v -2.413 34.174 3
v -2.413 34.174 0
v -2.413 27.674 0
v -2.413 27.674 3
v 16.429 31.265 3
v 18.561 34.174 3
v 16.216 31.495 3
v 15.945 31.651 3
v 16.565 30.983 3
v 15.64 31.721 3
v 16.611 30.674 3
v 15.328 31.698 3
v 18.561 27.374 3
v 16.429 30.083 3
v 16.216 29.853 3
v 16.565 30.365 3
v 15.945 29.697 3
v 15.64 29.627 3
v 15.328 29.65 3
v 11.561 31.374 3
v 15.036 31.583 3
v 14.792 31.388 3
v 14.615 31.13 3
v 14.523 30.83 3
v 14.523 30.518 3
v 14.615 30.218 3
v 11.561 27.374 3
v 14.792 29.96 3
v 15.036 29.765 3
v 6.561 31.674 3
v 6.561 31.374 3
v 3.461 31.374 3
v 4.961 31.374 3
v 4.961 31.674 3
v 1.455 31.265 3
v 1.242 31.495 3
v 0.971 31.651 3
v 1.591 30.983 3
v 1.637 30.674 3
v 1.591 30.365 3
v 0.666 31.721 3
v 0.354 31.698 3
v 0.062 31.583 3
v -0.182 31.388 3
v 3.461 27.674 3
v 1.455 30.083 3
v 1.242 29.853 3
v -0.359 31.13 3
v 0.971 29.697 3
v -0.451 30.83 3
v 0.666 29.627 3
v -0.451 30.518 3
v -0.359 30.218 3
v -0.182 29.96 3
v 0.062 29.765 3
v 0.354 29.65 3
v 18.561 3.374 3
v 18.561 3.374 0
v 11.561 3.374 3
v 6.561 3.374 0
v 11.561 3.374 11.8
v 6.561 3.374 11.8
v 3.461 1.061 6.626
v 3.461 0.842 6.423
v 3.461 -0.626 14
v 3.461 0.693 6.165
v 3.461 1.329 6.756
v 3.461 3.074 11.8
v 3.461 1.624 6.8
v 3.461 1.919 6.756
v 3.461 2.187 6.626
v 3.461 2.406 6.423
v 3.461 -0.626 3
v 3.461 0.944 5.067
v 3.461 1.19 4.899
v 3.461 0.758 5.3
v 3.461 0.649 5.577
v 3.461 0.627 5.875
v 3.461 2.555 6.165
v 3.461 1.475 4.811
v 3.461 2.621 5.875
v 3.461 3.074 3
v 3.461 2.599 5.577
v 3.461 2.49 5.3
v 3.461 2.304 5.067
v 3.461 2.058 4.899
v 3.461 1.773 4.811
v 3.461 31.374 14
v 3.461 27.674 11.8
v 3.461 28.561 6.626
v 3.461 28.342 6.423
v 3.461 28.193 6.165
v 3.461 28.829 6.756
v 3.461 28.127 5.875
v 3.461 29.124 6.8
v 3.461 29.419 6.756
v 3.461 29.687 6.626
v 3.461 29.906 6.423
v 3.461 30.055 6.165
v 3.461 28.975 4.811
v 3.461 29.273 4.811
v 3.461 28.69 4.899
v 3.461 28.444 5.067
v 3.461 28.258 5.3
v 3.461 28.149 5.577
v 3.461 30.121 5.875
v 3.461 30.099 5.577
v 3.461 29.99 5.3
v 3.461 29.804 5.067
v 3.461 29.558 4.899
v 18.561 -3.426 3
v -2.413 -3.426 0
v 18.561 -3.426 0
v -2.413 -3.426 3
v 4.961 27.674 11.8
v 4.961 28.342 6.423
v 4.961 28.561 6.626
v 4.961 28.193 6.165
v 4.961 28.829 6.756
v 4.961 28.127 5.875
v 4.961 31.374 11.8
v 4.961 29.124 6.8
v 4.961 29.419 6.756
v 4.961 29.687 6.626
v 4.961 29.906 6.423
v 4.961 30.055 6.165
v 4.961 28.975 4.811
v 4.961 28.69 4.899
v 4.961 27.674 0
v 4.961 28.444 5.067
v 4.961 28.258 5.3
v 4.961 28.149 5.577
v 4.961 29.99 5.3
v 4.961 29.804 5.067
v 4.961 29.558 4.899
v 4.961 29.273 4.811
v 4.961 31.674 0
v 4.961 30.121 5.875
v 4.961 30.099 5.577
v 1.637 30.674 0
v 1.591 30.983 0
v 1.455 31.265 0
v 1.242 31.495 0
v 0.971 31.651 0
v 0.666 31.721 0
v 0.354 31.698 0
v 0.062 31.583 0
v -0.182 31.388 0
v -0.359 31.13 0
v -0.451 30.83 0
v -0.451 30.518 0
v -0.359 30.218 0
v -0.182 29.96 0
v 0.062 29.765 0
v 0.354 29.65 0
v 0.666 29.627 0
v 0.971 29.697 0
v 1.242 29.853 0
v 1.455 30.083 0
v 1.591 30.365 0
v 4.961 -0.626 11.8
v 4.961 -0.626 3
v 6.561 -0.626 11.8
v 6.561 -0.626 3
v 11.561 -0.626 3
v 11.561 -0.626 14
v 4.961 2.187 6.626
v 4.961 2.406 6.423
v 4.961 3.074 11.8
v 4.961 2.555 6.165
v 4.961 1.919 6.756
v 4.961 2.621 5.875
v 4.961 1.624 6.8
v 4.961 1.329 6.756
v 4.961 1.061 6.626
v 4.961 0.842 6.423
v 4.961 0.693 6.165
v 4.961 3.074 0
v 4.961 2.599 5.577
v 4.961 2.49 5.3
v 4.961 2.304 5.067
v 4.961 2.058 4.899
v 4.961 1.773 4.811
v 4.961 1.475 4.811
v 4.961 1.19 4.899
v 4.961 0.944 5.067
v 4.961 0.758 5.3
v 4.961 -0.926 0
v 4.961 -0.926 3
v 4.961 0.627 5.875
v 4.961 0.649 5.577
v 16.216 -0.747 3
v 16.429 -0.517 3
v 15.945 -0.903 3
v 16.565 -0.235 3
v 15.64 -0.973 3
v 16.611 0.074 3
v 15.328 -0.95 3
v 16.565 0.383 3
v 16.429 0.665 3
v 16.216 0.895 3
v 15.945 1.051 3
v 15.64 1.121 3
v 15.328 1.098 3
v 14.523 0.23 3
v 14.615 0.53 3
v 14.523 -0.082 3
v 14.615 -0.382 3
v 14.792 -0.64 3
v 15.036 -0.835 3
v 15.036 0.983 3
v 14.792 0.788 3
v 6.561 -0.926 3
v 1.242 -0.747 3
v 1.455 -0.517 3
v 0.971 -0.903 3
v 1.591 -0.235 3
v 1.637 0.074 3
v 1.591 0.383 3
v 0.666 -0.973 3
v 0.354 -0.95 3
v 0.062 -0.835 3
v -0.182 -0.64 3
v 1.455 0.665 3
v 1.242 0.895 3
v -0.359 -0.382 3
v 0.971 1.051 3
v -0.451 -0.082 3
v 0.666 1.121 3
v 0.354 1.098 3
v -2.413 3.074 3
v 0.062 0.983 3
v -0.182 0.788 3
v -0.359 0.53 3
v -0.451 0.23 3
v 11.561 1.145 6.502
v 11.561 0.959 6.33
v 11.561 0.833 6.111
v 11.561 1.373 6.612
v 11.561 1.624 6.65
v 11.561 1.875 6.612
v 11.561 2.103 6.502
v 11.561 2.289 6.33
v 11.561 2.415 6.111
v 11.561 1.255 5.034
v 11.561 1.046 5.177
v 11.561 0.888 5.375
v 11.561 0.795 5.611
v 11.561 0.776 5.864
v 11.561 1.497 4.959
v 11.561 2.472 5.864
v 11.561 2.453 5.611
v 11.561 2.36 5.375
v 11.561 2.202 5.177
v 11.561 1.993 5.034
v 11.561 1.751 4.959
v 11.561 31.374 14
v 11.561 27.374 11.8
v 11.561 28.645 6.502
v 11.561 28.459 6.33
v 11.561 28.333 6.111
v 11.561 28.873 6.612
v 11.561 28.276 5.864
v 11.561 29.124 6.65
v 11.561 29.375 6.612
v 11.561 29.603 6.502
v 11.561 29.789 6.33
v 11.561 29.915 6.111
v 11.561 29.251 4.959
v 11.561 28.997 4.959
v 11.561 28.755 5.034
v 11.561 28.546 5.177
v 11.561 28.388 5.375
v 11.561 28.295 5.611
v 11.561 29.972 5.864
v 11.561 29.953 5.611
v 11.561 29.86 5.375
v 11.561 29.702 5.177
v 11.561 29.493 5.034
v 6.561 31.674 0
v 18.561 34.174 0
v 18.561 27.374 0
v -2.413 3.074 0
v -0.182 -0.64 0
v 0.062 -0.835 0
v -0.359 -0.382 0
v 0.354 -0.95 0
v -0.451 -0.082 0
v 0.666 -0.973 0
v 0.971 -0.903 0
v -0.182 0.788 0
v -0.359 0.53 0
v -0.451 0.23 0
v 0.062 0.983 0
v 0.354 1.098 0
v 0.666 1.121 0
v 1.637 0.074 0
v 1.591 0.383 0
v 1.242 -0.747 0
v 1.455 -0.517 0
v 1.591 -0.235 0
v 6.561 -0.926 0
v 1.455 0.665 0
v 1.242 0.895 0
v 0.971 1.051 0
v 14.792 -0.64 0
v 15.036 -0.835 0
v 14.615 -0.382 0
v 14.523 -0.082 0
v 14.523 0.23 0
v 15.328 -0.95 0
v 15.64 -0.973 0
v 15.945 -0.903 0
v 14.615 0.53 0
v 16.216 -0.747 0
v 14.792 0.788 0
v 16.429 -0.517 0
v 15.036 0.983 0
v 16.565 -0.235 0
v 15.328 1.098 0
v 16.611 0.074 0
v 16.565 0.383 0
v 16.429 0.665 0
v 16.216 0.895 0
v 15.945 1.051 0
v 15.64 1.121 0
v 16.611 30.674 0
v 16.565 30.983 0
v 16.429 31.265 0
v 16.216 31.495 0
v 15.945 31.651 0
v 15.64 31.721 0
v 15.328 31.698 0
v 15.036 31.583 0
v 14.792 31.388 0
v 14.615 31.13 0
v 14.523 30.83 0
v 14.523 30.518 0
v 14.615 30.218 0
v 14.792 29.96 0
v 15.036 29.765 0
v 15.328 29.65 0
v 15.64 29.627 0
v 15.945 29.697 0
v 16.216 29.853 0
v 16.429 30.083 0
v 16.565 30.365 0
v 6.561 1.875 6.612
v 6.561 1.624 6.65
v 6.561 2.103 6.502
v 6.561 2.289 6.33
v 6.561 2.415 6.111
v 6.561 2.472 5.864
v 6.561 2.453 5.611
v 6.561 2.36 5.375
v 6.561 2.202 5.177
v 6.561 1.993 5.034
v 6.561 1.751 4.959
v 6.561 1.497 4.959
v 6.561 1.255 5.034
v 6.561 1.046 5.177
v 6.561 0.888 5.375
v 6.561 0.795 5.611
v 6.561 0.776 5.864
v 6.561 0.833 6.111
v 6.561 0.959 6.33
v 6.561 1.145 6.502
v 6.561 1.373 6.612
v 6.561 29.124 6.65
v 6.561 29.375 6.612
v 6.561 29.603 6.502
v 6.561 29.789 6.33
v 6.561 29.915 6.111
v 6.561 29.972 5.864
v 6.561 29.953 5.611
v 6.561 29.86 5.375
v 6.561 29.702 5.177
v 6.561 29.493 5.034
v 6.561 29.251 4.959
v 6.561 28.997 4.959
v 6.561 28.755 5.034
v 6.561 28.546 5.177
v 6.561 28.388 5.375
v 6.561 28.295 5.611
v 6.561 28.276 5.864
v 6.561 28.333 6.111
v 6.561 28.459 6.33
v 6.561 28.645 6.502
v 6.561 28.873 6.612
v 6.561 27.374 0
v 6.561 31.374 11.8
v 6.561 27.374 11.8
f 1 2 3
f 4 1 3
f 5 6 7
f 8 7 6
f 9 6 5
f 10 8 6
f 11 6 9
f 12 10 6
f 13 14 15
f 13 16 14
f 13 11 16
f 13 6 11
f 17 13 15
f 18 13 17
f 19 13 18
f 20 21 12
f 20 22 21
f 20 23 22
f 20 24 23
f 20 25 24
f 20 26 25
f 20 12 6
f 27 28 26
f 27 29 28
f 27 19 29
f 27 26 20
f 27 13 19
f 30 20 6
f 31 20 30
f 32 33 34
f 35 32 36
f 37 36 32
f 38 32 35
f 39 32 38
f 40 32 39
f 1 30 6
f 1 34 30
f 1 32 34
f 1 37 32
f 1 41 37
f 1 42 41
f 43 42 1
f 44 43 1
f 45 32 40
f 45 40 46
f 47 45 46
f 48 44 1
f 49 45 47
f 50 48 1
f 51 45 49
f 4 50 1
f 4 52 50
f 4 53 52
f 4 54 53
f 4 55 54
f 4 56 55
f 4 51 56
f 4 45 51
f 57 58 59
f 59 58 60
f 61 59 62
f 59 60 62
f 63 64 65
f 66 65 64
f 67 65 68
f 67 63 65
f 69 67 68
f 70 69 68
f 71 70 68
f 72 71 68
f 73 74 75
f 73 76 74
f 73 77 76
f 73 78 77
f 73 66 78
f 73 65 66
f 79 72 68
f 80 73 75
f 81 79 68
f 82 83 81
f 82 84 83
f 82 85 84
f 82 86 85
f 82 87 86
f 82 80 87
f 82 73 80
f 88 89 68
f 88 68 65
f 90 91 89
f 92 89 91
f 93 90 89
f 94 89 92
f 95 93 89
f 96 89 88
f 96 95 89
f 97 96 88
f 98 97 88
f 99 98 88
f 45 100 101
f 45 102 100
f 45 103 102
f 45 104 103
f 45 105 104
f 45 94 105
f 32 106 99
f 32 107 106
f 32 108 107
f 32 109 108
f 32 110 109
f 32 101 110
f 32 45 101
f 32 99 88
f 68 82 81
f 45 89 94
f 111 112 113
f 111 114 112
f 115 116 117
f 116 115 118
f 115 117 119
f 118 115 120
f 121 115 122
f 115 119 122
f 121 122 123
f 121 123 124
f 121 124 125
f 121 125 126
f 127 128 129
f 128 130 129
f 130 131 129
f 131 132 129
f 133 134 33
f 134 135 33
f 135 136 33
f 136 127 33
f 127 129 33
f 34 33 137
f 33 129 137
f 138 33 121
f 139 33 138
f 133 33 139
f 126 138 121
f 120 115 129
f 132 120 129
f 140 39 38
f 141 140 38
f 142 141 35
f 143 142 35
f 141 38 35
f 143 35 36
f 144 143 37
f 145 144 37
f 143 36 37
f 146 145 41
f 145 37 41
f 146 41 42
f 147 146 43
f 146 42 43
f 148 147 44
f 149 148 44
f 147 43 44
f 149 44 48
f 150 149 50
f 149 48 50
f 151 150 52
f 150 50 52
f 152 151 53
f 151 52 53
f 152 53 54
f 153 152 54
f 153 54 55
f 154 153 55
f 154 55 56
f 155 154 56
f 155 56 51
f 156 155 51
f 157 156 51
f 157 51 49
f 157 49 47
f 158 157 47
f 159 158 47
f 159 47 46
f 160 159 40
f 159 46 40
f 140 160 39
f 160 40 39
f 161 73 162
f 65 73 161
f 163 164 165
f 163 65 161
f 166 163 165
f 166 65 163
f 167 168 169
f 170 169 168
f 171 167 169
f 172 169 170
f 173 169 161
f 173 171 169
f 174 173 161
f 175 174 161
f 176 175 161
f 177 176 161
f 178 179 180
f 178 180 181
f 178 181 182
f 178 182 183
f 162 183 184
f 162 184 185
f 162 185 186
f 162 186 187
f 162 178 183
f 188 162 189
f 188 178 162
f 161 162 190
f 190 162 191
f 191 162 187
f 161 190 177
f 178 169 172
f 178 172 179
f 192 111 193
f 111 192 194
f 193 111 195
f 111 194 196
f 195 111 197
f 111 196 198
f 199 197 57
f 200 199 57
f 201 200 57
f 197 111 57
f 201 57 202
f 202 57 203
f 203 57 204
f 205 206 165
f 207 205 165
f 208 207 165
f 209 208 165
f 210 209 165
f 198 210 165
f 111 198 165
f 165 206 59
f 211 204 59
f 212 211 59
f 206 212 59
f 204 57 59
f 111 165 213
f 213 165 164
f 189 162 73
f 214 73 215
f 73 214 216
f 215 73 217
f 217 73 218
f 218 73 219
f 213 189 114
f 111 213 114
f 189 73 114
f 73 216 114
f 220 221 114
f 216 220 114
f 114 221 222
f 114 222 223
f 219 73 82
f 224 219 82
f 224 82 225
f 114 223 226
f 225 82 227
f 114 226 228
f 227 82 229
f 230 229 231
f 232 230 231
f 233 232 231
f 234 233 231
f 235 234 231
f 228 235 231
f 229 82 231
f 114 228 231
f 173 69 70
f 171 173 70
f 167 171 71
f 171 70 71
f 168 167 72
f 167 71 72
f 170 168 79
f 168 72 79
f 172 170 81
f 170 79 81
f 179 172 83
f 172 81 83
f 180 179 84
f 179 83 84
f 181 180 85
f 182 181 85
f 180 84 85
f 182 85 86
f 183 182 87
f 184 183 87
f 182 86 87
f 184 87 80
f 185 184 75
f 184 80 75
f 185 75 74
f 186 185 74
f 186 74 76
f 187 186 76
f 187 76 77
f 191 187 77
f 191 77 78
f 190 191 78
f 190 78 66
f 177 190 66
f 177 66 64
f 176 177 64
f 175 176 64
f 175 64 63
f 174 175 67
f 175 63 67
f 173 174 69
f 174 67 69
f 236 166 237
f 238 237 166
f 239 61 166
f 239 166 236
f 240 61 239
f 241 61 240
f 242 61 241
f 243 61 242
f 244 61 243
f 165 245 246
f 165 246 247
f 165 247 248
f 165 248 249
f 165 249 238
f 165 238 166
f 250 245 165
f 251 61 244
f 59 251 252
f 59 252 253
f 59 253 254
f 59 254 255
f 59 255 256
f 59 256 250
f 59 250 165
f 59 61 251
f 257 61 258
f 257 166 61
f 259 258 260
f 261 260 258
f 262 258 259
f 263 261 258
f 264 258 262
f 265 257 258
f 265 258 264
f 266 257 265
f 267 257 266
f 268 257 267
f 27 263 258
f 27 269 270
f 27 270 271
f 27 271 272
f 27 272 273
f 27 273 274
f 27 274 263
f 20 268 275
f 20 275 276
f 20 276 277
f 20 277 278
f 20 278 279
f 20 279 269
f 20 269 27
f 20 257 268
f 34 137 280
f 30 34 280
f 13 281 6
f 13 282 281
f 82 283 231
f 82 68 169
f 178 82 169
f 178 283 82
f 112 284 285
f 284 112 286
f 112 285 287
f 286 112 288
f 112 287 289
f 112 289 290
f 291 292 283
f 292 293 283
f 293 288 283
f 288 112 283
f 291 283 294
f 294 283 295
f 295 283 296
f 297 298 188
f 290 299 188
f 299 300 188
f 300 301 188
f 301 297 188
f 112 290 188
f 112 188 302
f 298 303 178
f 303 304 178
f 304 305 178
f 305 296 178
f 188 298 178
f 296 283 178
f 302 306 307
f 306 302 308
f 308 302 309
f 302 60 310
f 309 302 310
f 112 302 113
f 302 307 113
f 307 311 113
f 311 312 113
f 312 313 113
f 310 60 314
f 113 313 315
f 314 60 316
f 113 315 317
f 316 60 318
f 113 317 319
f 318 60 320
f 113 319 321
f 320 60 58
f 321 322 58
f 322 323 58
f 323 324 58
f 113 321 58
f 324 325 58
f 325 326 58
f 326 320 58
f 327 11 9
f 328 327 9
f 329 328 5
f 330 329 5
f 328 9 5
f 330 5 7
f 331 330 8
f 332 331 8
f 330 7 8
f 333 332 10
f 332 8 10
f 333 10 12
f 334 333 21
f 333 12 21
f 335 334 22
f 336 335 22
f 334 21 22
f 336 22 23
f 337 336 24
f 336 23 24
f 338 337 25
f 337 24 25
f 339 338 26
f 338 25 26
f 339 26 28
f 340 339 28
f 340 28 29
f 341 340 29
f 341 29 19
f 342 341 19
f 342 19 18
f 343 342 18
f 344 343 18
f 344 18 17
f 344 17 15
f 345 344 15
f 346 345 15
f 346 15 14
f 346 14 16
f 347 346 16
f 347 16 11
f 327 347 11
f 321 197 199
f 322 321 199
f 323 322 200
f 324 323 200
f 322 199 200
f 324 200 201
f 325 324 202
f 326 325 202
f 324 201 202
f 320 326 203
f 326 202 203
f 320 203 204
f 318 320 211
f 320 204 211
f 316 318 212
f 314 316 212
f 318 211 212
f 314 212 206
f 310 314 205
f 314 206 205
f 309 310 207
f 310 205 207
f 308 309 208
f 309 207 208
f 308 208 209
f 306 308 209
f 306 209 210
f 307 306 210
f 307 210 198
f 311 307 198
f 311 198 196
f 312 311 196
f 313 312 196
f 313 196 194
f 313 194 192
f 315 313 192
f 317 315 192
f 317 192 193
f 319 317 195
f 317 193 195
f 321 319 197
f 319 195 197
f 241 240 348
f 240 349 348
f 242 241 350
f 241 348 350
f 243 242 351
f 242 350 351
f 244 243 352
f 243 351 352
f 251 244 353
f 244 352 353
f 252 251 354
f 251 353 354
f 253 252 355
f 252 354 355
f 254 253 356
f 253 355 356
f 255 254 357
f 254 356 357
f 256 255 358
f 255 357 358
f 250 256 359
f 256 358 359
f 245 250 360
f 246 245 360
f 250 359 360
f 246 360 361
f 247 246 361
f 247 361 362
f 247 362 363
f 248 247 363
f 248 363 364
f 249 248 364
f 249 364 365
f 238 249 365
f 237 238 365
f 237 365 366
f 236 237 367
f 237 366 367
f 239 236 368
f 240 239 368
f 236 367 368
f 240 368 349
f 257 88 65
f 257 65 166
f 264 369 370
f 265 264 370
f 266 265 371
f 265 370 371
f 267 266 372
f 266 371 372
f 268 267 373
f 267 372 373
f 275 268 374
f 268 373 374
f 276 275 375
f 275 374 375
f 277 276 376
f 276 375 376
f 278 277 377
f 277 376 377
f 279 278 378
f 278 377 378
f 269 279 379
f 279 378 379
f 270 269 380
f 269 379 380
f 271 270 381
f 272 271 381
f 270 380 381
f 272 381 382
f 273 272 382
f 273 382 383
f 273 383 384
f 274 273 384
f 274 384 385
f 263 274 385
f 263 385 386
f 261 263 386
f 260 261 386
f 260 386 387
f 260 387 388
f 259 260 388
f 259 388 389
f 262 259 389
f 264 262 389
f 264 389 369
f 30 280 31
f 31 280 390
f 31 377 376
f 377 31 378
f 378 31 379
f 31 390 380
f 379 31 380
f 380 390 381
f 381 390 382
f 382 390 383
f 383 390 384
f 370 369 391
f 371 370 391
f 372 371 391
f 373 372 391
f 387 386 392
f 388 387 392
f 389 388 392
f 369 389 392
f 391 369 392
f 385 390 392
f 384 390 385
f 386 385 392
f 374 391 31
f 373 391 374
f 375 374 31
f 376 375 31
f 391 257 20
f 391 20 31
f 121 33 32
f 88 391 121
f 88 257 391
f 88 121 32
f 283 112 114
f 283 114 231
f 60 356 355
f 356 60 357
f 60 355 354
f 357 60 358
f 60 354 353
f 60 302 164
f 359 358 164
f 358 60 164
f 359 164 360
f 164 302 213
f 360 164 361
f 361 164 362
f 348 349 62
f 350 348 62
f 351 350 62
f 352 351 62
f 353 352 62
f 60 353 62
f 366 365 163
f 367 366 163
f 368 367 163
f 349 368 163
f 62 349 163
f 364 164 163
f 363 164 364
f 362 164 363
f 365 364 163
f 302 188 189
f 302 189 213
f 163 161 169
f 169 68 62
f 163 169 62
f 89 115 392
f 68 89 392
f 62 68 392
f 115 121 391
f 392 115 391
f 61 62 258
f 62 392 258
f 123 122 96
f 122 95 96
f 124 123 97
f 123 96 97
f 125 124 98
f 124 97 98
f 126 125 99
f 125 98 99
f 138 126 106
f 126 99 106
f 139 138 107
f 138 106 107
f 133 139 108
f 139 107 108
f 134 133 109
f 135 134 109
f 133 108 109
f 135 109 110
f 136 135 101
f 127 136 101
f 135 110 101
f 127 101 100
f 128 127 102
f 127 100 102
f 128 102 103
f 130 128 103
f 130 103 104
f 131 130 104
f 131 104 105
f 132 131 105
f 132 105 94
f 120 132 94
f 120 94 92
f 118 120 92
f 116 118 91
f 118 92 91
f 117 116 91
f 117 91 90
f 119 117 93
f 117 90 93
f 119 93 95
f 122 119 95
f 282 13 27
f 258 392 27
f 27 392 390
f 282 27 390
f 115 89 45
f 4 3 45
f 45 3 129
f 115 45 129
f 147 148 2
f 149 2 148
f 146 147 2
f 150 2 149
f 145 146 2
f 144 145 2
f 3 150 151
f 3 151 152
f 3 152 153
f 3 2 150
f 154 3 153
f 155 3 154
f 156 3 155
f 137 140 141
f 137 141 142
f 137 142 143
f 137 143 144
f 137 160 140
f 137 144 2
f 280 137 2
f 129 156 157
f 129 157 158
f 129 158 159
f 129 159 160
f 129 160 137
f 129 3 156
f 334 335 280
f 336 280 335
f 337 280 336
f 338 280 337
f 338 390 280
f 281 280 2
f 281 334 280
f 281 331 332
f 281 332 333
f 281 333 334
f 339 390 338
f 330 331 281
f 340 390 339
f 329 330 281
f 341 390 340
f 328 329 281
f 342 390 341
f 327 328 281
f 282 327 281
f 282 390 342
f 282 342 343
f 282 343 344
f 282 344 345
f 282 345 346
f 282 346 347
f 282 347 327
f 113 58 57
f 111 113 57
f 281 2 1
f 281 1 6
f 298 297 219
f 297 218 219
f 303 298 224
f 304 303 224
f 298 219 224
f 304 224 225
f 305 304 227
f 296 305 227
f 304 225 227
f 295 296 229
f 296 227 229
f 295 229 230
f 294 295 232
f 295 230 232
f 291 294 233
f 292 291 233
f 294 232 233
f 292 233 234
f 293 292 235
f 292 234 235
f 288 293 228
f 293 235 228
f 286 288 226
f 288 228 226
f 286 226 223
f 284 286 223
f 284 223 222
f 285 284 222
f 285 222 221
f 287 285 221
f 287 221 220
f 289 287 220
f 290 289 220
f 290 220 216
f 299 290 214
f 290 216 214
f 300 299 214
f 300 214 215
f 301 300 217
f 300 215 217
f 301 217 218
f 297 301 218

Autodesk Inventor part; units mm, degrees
ref_plane "YZ Plane" through (0, 0, 0) normal (1, 0, 0) x (0, 1, 0)
ref_plane "XZ Plane" through (0, 0, 0) normal (0, 1, 0) x (-1, 0, 0)
ref_plane "XY Plane" through (0, 0, 0) normal (0, 0, 1) x (1, 0, 0)
sketch "スケッチ1" plane through (0, 0, 0) normal (0, 0, 1) x (1, 0, 0)
  line L0 (4.7874, 3.074) -> (-2.4126, 3.074) construction
  line L1 (-2.4126, 3.074) -> (-2.4126, -2.5626) construction
  line L2 (4.6566, -2.5626) -> (-2.4126, -2.5626) construction
  line L3 (4.6566, -14.1826) -> (4.6566, -2.5626) construction
  line L4 (32.7567, -14.1826) -> (4.6566, -14.1826) construction
  arc A0 (33.6403, -15.0662) -> (32.7567, -14.1826) centre (32.7567, -15.0662) ccw construction
  line L5 (33.6403, -15.0662) -> (33.6403, -5.3461) construction
  arc A1 (32.7567, -6.2297) -> (33.6403, -5.3461) centre (32.7567, -5.3461) ccw construction
  line L6 (32.7567, -6.2297) -> (28.4268, -6.2297) construction
  line L7 (28.4268, 12.9897) -> (28.4268, -6.2297) construction
  line L8 (28.4268, 12.9897) -> (33.7287, 12.9897) construction
  line L9 (33.7287, 34.374) -> (33.7287, 12.9897) construction
  line L10 (-2.4126, 34.374) -> (33.7287, 34.374) construction
  line L11 (-2.4126, 34.374) -> (-2.4126, 27.674) construction
  line L12 (-2.4126, 27.674) -> (4.7874, 27.674) construction
  line L13 (4.7874, 27.674) -> (4.7874, 31.674) construction
  line L14 (4.7874, 31.674) -> (7.0874, 31.674) construction
  line L15 (7.0874, 31.674) -> (7.0874, 27.674) construction
  line L16 (7.0874, 27.674) -> (22.5874, 27.674) construction
  line L17 (22.5874, 27.674) -> (22.5874, 3.074) construction
  line L18 (22.5874, 3.074) -> (7.0874, 3.074) construction
  line L19 (7.0874, 3.074) -> (7.0874, -0.926) construction
  line L20 (7.0874, -0.926) -> (4.7874, -0.926) construction
  line L21 (4.7874, -0.926) -> (4.7874, 3.074) construction
  line L22 (4.9614, 30.124) -> (6.5614, 30.124) construction
  line L23 (4.9614, 28.124) -> (6.5614, 28.124) construction
  line L24 (6.5614, 27.174) -> (20.8114, 27.174) construction
  line L25 (6.5614, 29.374) -> (6.5614, 31.374) construction
  line L26 (6.5614, 26.174) -> (6.5614, 29.374) construction
  line L27 (18.4524, 3.574) -> (6.5614, 3.574) construction
  line L28 (6.5614, 1.374) -> (6.5614, 4.574) construction
  line L29 (6.5614, -0.626) -> (6.5614, 1.374) construction
  line L30 (4.9614, 2.624) -> (6.5614, 2.624) construction
  line L31 (4.9614, 0.624) -> (6.5614, 0.624) construction
  line L32 (6.5614, 31.374) -> (18.5614, 31.374)
  line L33 (18.5614, 31.374) -> (18.5614, -0.626)
  line L34 (18.5614, -0.626) -> (6.5614, -0.626)
  line L35 (6.5614, -0.626) -> (6.5614, 31.374)
  circle A2 centre (0.5874, 30.674) radius 0.8
  circle A3 centre (15.5614, 0.074) radius 0.8
  circle A4 centre (0.5874, 0.074) radius 0.8
  circle A5 centre (15.5614, 30.674) radius 0.8
  point P0 (0, 0)
extrude "押し出し1" add sketch "スケッチ1" along normal blind 14 contours L32 A5 L33 L34 A3 L35 | L32 A5 | A3 L34 picked at (15.5843, 30.875) picked at (15.5358, 0.3268)
sketch "スケッチ2" plane through (6.5614, -0.626, 0) normal (-1, 0, 0) x (0, 0, 1)
  line L0 (1, 27.8) -> (10.6, 27.8) construction
  arc A0 (11.6, 26.8) -> (10.6, 27.8) centre (10.6, 26.8) ccw construction
  line L1 (11.6, 26.8) -> (11.6, 30) construction
  arc A1 (11.6, 30) -> (9.6, 32) centre (9.6, 30) ccw construction
  line L2 (2, 32) -> (9.6, 32) construction
  arc A2 (2, 32) -> (0, 30) centre (2, 30) ccw construction
  line L3 (0, 26.8) -> (0, 30) construction
  arc A3 (1, 27.8) -> (0, 26.8) centre (1, 26.8) ccw construction
  circle A4 centre (5.8, 29.75) radius 1 construction
  arc A5 (10.6, 4.2) -> (11.6, 5.2) centre (10.6, 5.2) ccw construction
  line L4 (10.6, 4.2) -> (1, 4.2) construction
  arc A6 (0, 5.2) -> (1, 4.2) centre (1, 5.2) ccw construction
  line L5 (0, 2) -> (0, 5.2) construction
  arc A7 (0, 2) -> (2, 0) centre (2, 2) ccw construction
  line L6 (9.6, 0) -> (2, 0) construction
  arc A8 (9.6, 0) -> (11.6, 2) centre (9.6, 2) ccw construction
  line L7 (11.6, 2) -> (11.6, 5.2) construction
  circle A9 centre (5.8, 2.25) radius 1 construction
  circle A10 centre (5.8, 29.75) radius 0.85
  circle A11 centre (5.8, 2.25) radius 0.85
  point P0 (0, 0.626)
  dimension "d3" = 1.7
extrude "押し出し2" cut sketch "スケッチ2" against normal up to next
sketch "スケッチ3" plane through (6.5614, -0.626, 0) normal (-1, 0, 0) x (0, 0, 1)
  line L0 (9.6, 27.8) -> (2, 27.8) construction
  line L1 (11.6, 9.918) -> (11.6, 25.8) construction
  spline S0 degree 5 poles (31.6664, 3.8342) (33.0444, 2.9064) (34.3681, 1.8973) (35.6334, 0.8093) (37.4433, -0.9431) (39.0884, -2.8469) (39.625, -3.5071) (40.1413, -4.1828) (40.6369, -4.8737) knots 0.500883 0.500883 0.500883 0.500883 0.500883 0.500883 16.687593 16.687593 16.687593 24.970224 24.970224 24.970224 24.970224 24.970224 24.970224 construction
  line L2 (1, 27.8) -> (10.6, 27.8) construction
  arc A0 (11.6, 26.8) -> (10.6, 27.8) centre (10.6, 26.8) ccw construction
  line L3 (11.6, 26.8) -> (11.6, 30) construction
  arc A1 (11.6, 30) -> (9.6, 32) centre (9.6, 30) ccw construction
  line L4 (2, 32) -> (9.6, 32) construction
  arc A2 (2, 32) -> (0, 30) centre (2, 30) ccw construction
  line L5 (0, 26.8) -> (0, 30) construction
  arc A3 (1, 27.8) -> (0, 26.8) centre (1, 26.8) ccw construction
  circle A4 centre (5.8, 29.75) radius 1 construction
  arc A5 (10.6, 4.2) -> (11.6, 5.2) centre (10.6, 5.2) ccw construction
  line L6 (10.6, 4.2) -> (1, 4.2) construction
  arc A6 (0, 5.2) -> (1, 4.2) centre (1, 5.2) ccw construction
  line L7 (0, 2) -> (0, 5.2) construction
  arc A7 (0, 2) -> (2, 0) centre (2, 2) ccw construction
  line L8 (9.6, 0) -> (2, 0) construction
  arc A8 (9.6, 0) -> (11.6, 2) centre (9.6, 2) ccw construction
  line L9 (11.6, 2) -> (11.6, 5.2) construction
  circle A9 centre (5.8, 2.25) radius 1 construction
  line L10 (11.8, 28) -> (-0.2, 28)
  line L11 (-0.2, 28) -> (-0.2, 4)
  line L12 (-0.2, 4) -> (11.8, 4)
  line L13 (11.8, 4) -> (11.8, 28)
  line L14 (0, 0) -> (0, 32) projected
  point P0 (0, 0.626)
  dimension "d6" = 0.2
  dimension "d7" = 0.2
  dimension "d8" = 0.2
  dimension "d9" = 0.2
extrude "押し出し3" cut sketch "スケッチ3" against normal up to next
sketch "スケッチ4" plane through (6.5614, 31.374, 0) normal (0, 1, 0) x (1, 0, 0)
  line L0 (12, -14) -> (0, -14) projected
  line L1 (12, -14) -> (5, -14)
  line L2 (5, -14) -> (5, -3)
  line L3 (5, -3) -> (12, -3)
  line L4 (12, -3) -> (12, -14)
  line L5 (0, 0) -> (12, 0) projected
  point P0 (-6.5614, 0)
  dimension "d12" = 7
  dimension "d13" = 3
extrude "押し出し4" cut sketch "スケッチ4" against normal up to next
sketch "スケッチ5" plane through (6.5614, -0.626, 0) normal (0, -1, 0) x (1, 0, 0)
  line L0 (12, 0) -> (12, 3) projected
  line L1 (12, 3) -> (0, 3)
  line L2 (0, 3) -> (0, 0)
  line L3 (0, 0) -> (12, 0)
  line L4 (12, 0) -> (12, 3)
  point P0 (-6.5614, 0)
extrude "押し出し5" add sketch "スケッチ5" along normal blind 2.8
sketch "スケッチ6" plane through (6.5614, 31.374, 0) normal (0, 1, 0) x (1, 0, 0)
  line L0 (12, -3) -> (0, -3) projected
  line L1 (0, 0) -> (0, -14) projected
  line L2 (12, -3) -> (0, -3)
  line L3 (0, -3) -> (0, 0)
  line L4 (0, 0) -> (12, 0)
  line L5 (12, 0) -> (12, -3)
  point P0 (-6.5614, 0)
extrude "押し出し6" add sketch "スケッチ6" along normal blind 2.8
sketch "スケッチ7" plane through (0, 0, 0) normal (0, 0, -1) x (-1, 0, 0)
  line L0 (-4.7874, 3.074) -> (2.4126, 3.074) construction
  line L1 (2.4126, 3.074) -> (2.4126, -2.5626) construction
  line L2 (-4.6566, -2.5626) -> (2.4126, -2.5626) construction
  line L3 (-4.6566, -14.1826) -> (-4.6566, -2.5626) construction
  line L4 (-32.7567, -14.1826) -> (-4.6566, -14.1826) construction
  arc A0 (-32.7567, -14.1826) -> (-33.6403, -15.0662) centre (-32.7567, -15.0662) ccw construction
  line L5 (-33.6403, -15.0662) -> (-33.6403, -5.3461) construction
  arc A1 (-33.6403, -5.3461) -> (-32.7567, -6.2297) centre (-32.7567, -5.3461) ccw construction
  line L6 (-32.7567, -6.2297) -> (-28.4268, -6.2297) construction
  line L7 (-28.4268, 12.9897) -> (-28.4268, -6.2297) construction
  line L8 (-28.4268, 12.9897) -> (-33.7287, 12.9897) construction
  line L9 (-33.7287, 34.374) -> (-33.7287, 12.9897) construction
  line L10 (2.4126, 34.374) -> (-33.7287, 34.374) construction
  line L11 (2.4126, 34.374) -> (2.4126, 27.674) construction
  line L12 (2.4126, 27.674) -> (-4.7874, 27.674) construction
  line L13 (-4.7874, 27.674) -> (-4.7874, 31.674) construction
  line L14 (-4.7874, 31.674) -> (-7.0874, 31.674) construction
  line L15 (-7.0874, 31.674) -> (-7.0874, 27.674) construction
  line L16 (-7.0874, 27.674) -> (-22.5874, 27.674) construction
  line L17 (-22.5874, 27.674) -> (-22.5874, 3.074) construction
  line L18 (-22.5874, 3.074) -> (-7.0874, 3.074) construction
  line L19 (-7.0874, 3.074) -> (-7.0874, -0.926) construction
  line L20 (-7.0874, -0.926) -> (-4.7874, -0.926) construction
  line L21 (-4.7874, -0.926) -> (-4.7874, 3.074) construction
  line L22 (-4.9614, 31.374) -> (-4.9614, 29.374) construction
  line L23 (-6.9374, 3.074) -> (-6.9374, -0.926) construction
  line L24 (-22.5874, 3.074) -> (-7.0874, 3.074) construction
  line L25 (-22.4374, 27.674) -> (-22.4374, 3.074) construction
  line L26 (-7.0874, 27.674) -> (-22.5874, 27.674) construction
  line L27 (-6.9374, 31.674) -> (-6.9374, 27.674) construction
  line L28 (-4.7874, 31.674) -> (-7.0874, 31.674) construction
  line L29 (-4.6374, 27.674) -> (-4.6374, 31.674) construction
  line L30 (2.4126, 27.674) -> (-4.7874, 27.674) construction
  line L31 (2.5626, 3.074) -> (2.5626, 27.674) construction
  line L32 (-4.7874, 3.074) -> (2.4126, 3.074) construction
  line L33 (-4.6374, -0.926) -> (-4.6374, 3.074) construction
  line L34 (-7.0874, -0.926) -> (-4.7874, -0.926) construction
  line L35 (-4.9614, 1.374) -> (-4.9614, -0.626) construction
  line L36 (-6.5614, 27.374) -> (-6.5614, 34.174) projected
  line L37 (-6.5614, 34.174) -> (2.4126, 34.174)
  line L38 (2.4126, 34.174) -> (2.4126, 27.674)
  line L39 (2.4126, 27.674) -> (-4.9614, 27.674)
  line L40 (-4.9614, 27.674) -> (-4.9614, 31.674)
  line L41 (-4.9614, 31.674) -> (-6.5614, 31.674)
  line L42 (-6.5614, 31.674) -> (-6.5614, 34.174)
  line L43 (-6.5614, -0.626) -> (-6.5614, -3.426) projected
  line L44 (-6.5614, -3.426) -> (2.4126, -3.426)
  line L45 (2.4126, -3.426) -> (2.4126, 3.074)
  line L46 (2.4126, 3.074) -> (-4.9614, 3.074)
  line L47 (-4.9614, 3.074) -> (-4.9614, -0.926)
  line L48 (-4.9614, -0.926) -> (-6.5614, -0.926)
  line L49 (-6.5614, -0.926) -> (-6.5614, -3.426)
  circle A2 centre (-0.5874, 30.674) radius 0.8 projected
  circle A3 centre (-15.5614, 0.074) radius 0.8 projected
  circle A4 centre (-0.5874, 0.074) radius 0.8 projected
  circle A5 centre (-15.5614, 30.674) radius 0.8 projected
  point P0 (0, 0)
extrude "押し出し7" add sketch "スケッチ7" against normal up to surface (3 mm away) contours L36 L37 L38 L39 L40 L41 | L48 L47 L46 L45 L44 L43 | A2 | A4
sketch "スケッチ8" plane through (6.5614, 31.374, 3) normal (0, 0, 1) x (1, 0, 0)
  line L0 (-8.974, -28.3) -> (-1.6, -28.3) projected
  line L1 (-1.6, -32) -> (-3.1, -32)
  line L2 (-3.1, -32) -> (-3.1, -28.3)
  line L3 (-3.1, -28.3) -> (-1.6, -28.3)
  line L4 (-1.6, -28.3) -> (-1.6, -32)
  line L5 (-1.6, -32.3) -> (-1.6, -28.3) projected
  line L6 (0, -32) -> (5, -32) projected
  line L7 (-1.6, -3.7) -> (-8.974, -3.7) projected
  line L8 (-1.6, 0) -> (-3.1, 0)
  line L9 (-3.1, 0) -> (-3.1, -3.7)
  line L10 (-3.1, -3.7) -> (-1.6, -3.7)
  line L11 (-1.6, -3.7) -> (-1.6, 0)
  line L12 (5, 0) -> (0, 0) projected
  line L13 (-1.6, -3.7) -> (-1.6, 0.3) projected
  point P0 (-6.5614, -31.374)
  dimension "d22" = 1.5
extrude "押し出し8" add sketch "スケッチ8" along normal up to surface (11 mm away)
sketch "スケッチ9" plane through (0, 0, 14) normal (0, 0, 1) x (1, 0, 0)
  line L0 (11.5614, -0.626) -> (11.5614, 31.374) construction
  line L1 (11.5614, 31.374) -> (6.5614, 31.374) construction
  line L2 (6.5614, 31.374) -> (6.5614, -0.626) construction
  line L3 (6.5614, -0.626) -> (11.5614, -0.626) construction
  line L4 (4.9614, 31.374) -> (4.9614, 27.674) construction
  line L5 (3.4614, 31.374) -> (4.9614, 31.374) construction
  line L6 (3.4614, 27.674) -> (3.4614, 31.374) construction
  line L7 (4.9614, 27.674) -> (3.4614, 27.674) construction
  line L8 (4.9614, -0.626) -> (3.4614, -0.626) construction
  line L9 (4.9614, 3.074) -> (4.9614, -0.626) construction
  line L10 (3.4614, 3.074) -> (4.9614, 3.074) construction
  line L11 (3.4614, -0.626) -> (3.4614, 3.074) construction
  line L12 (6.5614, 31.374) -> (4.9614, 31.374)
  line L13 (4.9614, 31.374) -> (4.9614, 27.674)
  line L14 (4.9614, 27.674) -> (3.4614, 27.674) projected
  line L15 (4.9614, 27.674) -> (3.4614, 27.674)
  line L16 (3.4614, -0.626) -> (3.4614, 3.074) projected
  line L17 (3.4614, 27.674) -> (3.4614, 3.074)
  line L18 (3.4614, 3.074) -> (4.9614, 3.074)
  line L19 (4.9614, -0.626) -> (3.4614, -0.626) projected
  line L20 (4.9614, 3.074) -> (4.9614, -0.626)
  line L21 (4.9614, -0.626) -> (6.5614, -0.626)
  line L22 (6.5614, -0.626) -> (6.5614, 31.374)
  point P0 (0, 0)
extrude "押し出し9" add sketch "スケッチ9" against normal up to surface (2.2 mm away) contours L22 L21 L20 L18 L17 L14 L13 L12
sketch "スケッチ10" plane through (3.4614, 27.674, 3) normal (-1, 0, 0) x (0, 0, 1)
  circle A0 centre (2.8, 1.45) radius 0.85 construction
  circle A1 centre (2.8, -26.05) radius 1 construction
  circle A2 centre (2.8, 1.45) radius 1
  circle A3 centre (2.8, -26.05) radius 1
  point P0 (-3, -27.674)
  dimension "d27" = 2
extrude "押し出し10" cut sketch "スケッチ10" against normal up to next
sketch "スケッチ11" plane through (6.5614, 31.374, 3) normal (0, 0, 1) x (1, 0, 0)
  circle A0 centre (9, -0.7) radius 1.05
  circle A1 centre (-5.974, -0.7) radius 1.05
  line L0 (-8.974, 2.8) -> (-8.974, -3.7) projected
  line L1 (-8.974, -3.7) -> (-3.1, -3.7) projected
  line L2 (12, -4) -> (12, 2.8) projected
  circle A2 centre (9, -31.3) radius 1.05
  circle A3 centre (-5.974, -31.3) radius 1.05
  line L3 (-3.1, -28.3) -> (-8.974, -28.3) projected
  point P0 (-6.5614, -31.374)
  dimension "d30" = 3
  dimension "d31" = 3
  dimension "d32" = 2.1
  dimension "d33" = 3
  dimension "d34" = 3
extrude "押し出し11" cut sketch "スケッチ11" against normal up to next
properties part number "MotorHolder_forM"
